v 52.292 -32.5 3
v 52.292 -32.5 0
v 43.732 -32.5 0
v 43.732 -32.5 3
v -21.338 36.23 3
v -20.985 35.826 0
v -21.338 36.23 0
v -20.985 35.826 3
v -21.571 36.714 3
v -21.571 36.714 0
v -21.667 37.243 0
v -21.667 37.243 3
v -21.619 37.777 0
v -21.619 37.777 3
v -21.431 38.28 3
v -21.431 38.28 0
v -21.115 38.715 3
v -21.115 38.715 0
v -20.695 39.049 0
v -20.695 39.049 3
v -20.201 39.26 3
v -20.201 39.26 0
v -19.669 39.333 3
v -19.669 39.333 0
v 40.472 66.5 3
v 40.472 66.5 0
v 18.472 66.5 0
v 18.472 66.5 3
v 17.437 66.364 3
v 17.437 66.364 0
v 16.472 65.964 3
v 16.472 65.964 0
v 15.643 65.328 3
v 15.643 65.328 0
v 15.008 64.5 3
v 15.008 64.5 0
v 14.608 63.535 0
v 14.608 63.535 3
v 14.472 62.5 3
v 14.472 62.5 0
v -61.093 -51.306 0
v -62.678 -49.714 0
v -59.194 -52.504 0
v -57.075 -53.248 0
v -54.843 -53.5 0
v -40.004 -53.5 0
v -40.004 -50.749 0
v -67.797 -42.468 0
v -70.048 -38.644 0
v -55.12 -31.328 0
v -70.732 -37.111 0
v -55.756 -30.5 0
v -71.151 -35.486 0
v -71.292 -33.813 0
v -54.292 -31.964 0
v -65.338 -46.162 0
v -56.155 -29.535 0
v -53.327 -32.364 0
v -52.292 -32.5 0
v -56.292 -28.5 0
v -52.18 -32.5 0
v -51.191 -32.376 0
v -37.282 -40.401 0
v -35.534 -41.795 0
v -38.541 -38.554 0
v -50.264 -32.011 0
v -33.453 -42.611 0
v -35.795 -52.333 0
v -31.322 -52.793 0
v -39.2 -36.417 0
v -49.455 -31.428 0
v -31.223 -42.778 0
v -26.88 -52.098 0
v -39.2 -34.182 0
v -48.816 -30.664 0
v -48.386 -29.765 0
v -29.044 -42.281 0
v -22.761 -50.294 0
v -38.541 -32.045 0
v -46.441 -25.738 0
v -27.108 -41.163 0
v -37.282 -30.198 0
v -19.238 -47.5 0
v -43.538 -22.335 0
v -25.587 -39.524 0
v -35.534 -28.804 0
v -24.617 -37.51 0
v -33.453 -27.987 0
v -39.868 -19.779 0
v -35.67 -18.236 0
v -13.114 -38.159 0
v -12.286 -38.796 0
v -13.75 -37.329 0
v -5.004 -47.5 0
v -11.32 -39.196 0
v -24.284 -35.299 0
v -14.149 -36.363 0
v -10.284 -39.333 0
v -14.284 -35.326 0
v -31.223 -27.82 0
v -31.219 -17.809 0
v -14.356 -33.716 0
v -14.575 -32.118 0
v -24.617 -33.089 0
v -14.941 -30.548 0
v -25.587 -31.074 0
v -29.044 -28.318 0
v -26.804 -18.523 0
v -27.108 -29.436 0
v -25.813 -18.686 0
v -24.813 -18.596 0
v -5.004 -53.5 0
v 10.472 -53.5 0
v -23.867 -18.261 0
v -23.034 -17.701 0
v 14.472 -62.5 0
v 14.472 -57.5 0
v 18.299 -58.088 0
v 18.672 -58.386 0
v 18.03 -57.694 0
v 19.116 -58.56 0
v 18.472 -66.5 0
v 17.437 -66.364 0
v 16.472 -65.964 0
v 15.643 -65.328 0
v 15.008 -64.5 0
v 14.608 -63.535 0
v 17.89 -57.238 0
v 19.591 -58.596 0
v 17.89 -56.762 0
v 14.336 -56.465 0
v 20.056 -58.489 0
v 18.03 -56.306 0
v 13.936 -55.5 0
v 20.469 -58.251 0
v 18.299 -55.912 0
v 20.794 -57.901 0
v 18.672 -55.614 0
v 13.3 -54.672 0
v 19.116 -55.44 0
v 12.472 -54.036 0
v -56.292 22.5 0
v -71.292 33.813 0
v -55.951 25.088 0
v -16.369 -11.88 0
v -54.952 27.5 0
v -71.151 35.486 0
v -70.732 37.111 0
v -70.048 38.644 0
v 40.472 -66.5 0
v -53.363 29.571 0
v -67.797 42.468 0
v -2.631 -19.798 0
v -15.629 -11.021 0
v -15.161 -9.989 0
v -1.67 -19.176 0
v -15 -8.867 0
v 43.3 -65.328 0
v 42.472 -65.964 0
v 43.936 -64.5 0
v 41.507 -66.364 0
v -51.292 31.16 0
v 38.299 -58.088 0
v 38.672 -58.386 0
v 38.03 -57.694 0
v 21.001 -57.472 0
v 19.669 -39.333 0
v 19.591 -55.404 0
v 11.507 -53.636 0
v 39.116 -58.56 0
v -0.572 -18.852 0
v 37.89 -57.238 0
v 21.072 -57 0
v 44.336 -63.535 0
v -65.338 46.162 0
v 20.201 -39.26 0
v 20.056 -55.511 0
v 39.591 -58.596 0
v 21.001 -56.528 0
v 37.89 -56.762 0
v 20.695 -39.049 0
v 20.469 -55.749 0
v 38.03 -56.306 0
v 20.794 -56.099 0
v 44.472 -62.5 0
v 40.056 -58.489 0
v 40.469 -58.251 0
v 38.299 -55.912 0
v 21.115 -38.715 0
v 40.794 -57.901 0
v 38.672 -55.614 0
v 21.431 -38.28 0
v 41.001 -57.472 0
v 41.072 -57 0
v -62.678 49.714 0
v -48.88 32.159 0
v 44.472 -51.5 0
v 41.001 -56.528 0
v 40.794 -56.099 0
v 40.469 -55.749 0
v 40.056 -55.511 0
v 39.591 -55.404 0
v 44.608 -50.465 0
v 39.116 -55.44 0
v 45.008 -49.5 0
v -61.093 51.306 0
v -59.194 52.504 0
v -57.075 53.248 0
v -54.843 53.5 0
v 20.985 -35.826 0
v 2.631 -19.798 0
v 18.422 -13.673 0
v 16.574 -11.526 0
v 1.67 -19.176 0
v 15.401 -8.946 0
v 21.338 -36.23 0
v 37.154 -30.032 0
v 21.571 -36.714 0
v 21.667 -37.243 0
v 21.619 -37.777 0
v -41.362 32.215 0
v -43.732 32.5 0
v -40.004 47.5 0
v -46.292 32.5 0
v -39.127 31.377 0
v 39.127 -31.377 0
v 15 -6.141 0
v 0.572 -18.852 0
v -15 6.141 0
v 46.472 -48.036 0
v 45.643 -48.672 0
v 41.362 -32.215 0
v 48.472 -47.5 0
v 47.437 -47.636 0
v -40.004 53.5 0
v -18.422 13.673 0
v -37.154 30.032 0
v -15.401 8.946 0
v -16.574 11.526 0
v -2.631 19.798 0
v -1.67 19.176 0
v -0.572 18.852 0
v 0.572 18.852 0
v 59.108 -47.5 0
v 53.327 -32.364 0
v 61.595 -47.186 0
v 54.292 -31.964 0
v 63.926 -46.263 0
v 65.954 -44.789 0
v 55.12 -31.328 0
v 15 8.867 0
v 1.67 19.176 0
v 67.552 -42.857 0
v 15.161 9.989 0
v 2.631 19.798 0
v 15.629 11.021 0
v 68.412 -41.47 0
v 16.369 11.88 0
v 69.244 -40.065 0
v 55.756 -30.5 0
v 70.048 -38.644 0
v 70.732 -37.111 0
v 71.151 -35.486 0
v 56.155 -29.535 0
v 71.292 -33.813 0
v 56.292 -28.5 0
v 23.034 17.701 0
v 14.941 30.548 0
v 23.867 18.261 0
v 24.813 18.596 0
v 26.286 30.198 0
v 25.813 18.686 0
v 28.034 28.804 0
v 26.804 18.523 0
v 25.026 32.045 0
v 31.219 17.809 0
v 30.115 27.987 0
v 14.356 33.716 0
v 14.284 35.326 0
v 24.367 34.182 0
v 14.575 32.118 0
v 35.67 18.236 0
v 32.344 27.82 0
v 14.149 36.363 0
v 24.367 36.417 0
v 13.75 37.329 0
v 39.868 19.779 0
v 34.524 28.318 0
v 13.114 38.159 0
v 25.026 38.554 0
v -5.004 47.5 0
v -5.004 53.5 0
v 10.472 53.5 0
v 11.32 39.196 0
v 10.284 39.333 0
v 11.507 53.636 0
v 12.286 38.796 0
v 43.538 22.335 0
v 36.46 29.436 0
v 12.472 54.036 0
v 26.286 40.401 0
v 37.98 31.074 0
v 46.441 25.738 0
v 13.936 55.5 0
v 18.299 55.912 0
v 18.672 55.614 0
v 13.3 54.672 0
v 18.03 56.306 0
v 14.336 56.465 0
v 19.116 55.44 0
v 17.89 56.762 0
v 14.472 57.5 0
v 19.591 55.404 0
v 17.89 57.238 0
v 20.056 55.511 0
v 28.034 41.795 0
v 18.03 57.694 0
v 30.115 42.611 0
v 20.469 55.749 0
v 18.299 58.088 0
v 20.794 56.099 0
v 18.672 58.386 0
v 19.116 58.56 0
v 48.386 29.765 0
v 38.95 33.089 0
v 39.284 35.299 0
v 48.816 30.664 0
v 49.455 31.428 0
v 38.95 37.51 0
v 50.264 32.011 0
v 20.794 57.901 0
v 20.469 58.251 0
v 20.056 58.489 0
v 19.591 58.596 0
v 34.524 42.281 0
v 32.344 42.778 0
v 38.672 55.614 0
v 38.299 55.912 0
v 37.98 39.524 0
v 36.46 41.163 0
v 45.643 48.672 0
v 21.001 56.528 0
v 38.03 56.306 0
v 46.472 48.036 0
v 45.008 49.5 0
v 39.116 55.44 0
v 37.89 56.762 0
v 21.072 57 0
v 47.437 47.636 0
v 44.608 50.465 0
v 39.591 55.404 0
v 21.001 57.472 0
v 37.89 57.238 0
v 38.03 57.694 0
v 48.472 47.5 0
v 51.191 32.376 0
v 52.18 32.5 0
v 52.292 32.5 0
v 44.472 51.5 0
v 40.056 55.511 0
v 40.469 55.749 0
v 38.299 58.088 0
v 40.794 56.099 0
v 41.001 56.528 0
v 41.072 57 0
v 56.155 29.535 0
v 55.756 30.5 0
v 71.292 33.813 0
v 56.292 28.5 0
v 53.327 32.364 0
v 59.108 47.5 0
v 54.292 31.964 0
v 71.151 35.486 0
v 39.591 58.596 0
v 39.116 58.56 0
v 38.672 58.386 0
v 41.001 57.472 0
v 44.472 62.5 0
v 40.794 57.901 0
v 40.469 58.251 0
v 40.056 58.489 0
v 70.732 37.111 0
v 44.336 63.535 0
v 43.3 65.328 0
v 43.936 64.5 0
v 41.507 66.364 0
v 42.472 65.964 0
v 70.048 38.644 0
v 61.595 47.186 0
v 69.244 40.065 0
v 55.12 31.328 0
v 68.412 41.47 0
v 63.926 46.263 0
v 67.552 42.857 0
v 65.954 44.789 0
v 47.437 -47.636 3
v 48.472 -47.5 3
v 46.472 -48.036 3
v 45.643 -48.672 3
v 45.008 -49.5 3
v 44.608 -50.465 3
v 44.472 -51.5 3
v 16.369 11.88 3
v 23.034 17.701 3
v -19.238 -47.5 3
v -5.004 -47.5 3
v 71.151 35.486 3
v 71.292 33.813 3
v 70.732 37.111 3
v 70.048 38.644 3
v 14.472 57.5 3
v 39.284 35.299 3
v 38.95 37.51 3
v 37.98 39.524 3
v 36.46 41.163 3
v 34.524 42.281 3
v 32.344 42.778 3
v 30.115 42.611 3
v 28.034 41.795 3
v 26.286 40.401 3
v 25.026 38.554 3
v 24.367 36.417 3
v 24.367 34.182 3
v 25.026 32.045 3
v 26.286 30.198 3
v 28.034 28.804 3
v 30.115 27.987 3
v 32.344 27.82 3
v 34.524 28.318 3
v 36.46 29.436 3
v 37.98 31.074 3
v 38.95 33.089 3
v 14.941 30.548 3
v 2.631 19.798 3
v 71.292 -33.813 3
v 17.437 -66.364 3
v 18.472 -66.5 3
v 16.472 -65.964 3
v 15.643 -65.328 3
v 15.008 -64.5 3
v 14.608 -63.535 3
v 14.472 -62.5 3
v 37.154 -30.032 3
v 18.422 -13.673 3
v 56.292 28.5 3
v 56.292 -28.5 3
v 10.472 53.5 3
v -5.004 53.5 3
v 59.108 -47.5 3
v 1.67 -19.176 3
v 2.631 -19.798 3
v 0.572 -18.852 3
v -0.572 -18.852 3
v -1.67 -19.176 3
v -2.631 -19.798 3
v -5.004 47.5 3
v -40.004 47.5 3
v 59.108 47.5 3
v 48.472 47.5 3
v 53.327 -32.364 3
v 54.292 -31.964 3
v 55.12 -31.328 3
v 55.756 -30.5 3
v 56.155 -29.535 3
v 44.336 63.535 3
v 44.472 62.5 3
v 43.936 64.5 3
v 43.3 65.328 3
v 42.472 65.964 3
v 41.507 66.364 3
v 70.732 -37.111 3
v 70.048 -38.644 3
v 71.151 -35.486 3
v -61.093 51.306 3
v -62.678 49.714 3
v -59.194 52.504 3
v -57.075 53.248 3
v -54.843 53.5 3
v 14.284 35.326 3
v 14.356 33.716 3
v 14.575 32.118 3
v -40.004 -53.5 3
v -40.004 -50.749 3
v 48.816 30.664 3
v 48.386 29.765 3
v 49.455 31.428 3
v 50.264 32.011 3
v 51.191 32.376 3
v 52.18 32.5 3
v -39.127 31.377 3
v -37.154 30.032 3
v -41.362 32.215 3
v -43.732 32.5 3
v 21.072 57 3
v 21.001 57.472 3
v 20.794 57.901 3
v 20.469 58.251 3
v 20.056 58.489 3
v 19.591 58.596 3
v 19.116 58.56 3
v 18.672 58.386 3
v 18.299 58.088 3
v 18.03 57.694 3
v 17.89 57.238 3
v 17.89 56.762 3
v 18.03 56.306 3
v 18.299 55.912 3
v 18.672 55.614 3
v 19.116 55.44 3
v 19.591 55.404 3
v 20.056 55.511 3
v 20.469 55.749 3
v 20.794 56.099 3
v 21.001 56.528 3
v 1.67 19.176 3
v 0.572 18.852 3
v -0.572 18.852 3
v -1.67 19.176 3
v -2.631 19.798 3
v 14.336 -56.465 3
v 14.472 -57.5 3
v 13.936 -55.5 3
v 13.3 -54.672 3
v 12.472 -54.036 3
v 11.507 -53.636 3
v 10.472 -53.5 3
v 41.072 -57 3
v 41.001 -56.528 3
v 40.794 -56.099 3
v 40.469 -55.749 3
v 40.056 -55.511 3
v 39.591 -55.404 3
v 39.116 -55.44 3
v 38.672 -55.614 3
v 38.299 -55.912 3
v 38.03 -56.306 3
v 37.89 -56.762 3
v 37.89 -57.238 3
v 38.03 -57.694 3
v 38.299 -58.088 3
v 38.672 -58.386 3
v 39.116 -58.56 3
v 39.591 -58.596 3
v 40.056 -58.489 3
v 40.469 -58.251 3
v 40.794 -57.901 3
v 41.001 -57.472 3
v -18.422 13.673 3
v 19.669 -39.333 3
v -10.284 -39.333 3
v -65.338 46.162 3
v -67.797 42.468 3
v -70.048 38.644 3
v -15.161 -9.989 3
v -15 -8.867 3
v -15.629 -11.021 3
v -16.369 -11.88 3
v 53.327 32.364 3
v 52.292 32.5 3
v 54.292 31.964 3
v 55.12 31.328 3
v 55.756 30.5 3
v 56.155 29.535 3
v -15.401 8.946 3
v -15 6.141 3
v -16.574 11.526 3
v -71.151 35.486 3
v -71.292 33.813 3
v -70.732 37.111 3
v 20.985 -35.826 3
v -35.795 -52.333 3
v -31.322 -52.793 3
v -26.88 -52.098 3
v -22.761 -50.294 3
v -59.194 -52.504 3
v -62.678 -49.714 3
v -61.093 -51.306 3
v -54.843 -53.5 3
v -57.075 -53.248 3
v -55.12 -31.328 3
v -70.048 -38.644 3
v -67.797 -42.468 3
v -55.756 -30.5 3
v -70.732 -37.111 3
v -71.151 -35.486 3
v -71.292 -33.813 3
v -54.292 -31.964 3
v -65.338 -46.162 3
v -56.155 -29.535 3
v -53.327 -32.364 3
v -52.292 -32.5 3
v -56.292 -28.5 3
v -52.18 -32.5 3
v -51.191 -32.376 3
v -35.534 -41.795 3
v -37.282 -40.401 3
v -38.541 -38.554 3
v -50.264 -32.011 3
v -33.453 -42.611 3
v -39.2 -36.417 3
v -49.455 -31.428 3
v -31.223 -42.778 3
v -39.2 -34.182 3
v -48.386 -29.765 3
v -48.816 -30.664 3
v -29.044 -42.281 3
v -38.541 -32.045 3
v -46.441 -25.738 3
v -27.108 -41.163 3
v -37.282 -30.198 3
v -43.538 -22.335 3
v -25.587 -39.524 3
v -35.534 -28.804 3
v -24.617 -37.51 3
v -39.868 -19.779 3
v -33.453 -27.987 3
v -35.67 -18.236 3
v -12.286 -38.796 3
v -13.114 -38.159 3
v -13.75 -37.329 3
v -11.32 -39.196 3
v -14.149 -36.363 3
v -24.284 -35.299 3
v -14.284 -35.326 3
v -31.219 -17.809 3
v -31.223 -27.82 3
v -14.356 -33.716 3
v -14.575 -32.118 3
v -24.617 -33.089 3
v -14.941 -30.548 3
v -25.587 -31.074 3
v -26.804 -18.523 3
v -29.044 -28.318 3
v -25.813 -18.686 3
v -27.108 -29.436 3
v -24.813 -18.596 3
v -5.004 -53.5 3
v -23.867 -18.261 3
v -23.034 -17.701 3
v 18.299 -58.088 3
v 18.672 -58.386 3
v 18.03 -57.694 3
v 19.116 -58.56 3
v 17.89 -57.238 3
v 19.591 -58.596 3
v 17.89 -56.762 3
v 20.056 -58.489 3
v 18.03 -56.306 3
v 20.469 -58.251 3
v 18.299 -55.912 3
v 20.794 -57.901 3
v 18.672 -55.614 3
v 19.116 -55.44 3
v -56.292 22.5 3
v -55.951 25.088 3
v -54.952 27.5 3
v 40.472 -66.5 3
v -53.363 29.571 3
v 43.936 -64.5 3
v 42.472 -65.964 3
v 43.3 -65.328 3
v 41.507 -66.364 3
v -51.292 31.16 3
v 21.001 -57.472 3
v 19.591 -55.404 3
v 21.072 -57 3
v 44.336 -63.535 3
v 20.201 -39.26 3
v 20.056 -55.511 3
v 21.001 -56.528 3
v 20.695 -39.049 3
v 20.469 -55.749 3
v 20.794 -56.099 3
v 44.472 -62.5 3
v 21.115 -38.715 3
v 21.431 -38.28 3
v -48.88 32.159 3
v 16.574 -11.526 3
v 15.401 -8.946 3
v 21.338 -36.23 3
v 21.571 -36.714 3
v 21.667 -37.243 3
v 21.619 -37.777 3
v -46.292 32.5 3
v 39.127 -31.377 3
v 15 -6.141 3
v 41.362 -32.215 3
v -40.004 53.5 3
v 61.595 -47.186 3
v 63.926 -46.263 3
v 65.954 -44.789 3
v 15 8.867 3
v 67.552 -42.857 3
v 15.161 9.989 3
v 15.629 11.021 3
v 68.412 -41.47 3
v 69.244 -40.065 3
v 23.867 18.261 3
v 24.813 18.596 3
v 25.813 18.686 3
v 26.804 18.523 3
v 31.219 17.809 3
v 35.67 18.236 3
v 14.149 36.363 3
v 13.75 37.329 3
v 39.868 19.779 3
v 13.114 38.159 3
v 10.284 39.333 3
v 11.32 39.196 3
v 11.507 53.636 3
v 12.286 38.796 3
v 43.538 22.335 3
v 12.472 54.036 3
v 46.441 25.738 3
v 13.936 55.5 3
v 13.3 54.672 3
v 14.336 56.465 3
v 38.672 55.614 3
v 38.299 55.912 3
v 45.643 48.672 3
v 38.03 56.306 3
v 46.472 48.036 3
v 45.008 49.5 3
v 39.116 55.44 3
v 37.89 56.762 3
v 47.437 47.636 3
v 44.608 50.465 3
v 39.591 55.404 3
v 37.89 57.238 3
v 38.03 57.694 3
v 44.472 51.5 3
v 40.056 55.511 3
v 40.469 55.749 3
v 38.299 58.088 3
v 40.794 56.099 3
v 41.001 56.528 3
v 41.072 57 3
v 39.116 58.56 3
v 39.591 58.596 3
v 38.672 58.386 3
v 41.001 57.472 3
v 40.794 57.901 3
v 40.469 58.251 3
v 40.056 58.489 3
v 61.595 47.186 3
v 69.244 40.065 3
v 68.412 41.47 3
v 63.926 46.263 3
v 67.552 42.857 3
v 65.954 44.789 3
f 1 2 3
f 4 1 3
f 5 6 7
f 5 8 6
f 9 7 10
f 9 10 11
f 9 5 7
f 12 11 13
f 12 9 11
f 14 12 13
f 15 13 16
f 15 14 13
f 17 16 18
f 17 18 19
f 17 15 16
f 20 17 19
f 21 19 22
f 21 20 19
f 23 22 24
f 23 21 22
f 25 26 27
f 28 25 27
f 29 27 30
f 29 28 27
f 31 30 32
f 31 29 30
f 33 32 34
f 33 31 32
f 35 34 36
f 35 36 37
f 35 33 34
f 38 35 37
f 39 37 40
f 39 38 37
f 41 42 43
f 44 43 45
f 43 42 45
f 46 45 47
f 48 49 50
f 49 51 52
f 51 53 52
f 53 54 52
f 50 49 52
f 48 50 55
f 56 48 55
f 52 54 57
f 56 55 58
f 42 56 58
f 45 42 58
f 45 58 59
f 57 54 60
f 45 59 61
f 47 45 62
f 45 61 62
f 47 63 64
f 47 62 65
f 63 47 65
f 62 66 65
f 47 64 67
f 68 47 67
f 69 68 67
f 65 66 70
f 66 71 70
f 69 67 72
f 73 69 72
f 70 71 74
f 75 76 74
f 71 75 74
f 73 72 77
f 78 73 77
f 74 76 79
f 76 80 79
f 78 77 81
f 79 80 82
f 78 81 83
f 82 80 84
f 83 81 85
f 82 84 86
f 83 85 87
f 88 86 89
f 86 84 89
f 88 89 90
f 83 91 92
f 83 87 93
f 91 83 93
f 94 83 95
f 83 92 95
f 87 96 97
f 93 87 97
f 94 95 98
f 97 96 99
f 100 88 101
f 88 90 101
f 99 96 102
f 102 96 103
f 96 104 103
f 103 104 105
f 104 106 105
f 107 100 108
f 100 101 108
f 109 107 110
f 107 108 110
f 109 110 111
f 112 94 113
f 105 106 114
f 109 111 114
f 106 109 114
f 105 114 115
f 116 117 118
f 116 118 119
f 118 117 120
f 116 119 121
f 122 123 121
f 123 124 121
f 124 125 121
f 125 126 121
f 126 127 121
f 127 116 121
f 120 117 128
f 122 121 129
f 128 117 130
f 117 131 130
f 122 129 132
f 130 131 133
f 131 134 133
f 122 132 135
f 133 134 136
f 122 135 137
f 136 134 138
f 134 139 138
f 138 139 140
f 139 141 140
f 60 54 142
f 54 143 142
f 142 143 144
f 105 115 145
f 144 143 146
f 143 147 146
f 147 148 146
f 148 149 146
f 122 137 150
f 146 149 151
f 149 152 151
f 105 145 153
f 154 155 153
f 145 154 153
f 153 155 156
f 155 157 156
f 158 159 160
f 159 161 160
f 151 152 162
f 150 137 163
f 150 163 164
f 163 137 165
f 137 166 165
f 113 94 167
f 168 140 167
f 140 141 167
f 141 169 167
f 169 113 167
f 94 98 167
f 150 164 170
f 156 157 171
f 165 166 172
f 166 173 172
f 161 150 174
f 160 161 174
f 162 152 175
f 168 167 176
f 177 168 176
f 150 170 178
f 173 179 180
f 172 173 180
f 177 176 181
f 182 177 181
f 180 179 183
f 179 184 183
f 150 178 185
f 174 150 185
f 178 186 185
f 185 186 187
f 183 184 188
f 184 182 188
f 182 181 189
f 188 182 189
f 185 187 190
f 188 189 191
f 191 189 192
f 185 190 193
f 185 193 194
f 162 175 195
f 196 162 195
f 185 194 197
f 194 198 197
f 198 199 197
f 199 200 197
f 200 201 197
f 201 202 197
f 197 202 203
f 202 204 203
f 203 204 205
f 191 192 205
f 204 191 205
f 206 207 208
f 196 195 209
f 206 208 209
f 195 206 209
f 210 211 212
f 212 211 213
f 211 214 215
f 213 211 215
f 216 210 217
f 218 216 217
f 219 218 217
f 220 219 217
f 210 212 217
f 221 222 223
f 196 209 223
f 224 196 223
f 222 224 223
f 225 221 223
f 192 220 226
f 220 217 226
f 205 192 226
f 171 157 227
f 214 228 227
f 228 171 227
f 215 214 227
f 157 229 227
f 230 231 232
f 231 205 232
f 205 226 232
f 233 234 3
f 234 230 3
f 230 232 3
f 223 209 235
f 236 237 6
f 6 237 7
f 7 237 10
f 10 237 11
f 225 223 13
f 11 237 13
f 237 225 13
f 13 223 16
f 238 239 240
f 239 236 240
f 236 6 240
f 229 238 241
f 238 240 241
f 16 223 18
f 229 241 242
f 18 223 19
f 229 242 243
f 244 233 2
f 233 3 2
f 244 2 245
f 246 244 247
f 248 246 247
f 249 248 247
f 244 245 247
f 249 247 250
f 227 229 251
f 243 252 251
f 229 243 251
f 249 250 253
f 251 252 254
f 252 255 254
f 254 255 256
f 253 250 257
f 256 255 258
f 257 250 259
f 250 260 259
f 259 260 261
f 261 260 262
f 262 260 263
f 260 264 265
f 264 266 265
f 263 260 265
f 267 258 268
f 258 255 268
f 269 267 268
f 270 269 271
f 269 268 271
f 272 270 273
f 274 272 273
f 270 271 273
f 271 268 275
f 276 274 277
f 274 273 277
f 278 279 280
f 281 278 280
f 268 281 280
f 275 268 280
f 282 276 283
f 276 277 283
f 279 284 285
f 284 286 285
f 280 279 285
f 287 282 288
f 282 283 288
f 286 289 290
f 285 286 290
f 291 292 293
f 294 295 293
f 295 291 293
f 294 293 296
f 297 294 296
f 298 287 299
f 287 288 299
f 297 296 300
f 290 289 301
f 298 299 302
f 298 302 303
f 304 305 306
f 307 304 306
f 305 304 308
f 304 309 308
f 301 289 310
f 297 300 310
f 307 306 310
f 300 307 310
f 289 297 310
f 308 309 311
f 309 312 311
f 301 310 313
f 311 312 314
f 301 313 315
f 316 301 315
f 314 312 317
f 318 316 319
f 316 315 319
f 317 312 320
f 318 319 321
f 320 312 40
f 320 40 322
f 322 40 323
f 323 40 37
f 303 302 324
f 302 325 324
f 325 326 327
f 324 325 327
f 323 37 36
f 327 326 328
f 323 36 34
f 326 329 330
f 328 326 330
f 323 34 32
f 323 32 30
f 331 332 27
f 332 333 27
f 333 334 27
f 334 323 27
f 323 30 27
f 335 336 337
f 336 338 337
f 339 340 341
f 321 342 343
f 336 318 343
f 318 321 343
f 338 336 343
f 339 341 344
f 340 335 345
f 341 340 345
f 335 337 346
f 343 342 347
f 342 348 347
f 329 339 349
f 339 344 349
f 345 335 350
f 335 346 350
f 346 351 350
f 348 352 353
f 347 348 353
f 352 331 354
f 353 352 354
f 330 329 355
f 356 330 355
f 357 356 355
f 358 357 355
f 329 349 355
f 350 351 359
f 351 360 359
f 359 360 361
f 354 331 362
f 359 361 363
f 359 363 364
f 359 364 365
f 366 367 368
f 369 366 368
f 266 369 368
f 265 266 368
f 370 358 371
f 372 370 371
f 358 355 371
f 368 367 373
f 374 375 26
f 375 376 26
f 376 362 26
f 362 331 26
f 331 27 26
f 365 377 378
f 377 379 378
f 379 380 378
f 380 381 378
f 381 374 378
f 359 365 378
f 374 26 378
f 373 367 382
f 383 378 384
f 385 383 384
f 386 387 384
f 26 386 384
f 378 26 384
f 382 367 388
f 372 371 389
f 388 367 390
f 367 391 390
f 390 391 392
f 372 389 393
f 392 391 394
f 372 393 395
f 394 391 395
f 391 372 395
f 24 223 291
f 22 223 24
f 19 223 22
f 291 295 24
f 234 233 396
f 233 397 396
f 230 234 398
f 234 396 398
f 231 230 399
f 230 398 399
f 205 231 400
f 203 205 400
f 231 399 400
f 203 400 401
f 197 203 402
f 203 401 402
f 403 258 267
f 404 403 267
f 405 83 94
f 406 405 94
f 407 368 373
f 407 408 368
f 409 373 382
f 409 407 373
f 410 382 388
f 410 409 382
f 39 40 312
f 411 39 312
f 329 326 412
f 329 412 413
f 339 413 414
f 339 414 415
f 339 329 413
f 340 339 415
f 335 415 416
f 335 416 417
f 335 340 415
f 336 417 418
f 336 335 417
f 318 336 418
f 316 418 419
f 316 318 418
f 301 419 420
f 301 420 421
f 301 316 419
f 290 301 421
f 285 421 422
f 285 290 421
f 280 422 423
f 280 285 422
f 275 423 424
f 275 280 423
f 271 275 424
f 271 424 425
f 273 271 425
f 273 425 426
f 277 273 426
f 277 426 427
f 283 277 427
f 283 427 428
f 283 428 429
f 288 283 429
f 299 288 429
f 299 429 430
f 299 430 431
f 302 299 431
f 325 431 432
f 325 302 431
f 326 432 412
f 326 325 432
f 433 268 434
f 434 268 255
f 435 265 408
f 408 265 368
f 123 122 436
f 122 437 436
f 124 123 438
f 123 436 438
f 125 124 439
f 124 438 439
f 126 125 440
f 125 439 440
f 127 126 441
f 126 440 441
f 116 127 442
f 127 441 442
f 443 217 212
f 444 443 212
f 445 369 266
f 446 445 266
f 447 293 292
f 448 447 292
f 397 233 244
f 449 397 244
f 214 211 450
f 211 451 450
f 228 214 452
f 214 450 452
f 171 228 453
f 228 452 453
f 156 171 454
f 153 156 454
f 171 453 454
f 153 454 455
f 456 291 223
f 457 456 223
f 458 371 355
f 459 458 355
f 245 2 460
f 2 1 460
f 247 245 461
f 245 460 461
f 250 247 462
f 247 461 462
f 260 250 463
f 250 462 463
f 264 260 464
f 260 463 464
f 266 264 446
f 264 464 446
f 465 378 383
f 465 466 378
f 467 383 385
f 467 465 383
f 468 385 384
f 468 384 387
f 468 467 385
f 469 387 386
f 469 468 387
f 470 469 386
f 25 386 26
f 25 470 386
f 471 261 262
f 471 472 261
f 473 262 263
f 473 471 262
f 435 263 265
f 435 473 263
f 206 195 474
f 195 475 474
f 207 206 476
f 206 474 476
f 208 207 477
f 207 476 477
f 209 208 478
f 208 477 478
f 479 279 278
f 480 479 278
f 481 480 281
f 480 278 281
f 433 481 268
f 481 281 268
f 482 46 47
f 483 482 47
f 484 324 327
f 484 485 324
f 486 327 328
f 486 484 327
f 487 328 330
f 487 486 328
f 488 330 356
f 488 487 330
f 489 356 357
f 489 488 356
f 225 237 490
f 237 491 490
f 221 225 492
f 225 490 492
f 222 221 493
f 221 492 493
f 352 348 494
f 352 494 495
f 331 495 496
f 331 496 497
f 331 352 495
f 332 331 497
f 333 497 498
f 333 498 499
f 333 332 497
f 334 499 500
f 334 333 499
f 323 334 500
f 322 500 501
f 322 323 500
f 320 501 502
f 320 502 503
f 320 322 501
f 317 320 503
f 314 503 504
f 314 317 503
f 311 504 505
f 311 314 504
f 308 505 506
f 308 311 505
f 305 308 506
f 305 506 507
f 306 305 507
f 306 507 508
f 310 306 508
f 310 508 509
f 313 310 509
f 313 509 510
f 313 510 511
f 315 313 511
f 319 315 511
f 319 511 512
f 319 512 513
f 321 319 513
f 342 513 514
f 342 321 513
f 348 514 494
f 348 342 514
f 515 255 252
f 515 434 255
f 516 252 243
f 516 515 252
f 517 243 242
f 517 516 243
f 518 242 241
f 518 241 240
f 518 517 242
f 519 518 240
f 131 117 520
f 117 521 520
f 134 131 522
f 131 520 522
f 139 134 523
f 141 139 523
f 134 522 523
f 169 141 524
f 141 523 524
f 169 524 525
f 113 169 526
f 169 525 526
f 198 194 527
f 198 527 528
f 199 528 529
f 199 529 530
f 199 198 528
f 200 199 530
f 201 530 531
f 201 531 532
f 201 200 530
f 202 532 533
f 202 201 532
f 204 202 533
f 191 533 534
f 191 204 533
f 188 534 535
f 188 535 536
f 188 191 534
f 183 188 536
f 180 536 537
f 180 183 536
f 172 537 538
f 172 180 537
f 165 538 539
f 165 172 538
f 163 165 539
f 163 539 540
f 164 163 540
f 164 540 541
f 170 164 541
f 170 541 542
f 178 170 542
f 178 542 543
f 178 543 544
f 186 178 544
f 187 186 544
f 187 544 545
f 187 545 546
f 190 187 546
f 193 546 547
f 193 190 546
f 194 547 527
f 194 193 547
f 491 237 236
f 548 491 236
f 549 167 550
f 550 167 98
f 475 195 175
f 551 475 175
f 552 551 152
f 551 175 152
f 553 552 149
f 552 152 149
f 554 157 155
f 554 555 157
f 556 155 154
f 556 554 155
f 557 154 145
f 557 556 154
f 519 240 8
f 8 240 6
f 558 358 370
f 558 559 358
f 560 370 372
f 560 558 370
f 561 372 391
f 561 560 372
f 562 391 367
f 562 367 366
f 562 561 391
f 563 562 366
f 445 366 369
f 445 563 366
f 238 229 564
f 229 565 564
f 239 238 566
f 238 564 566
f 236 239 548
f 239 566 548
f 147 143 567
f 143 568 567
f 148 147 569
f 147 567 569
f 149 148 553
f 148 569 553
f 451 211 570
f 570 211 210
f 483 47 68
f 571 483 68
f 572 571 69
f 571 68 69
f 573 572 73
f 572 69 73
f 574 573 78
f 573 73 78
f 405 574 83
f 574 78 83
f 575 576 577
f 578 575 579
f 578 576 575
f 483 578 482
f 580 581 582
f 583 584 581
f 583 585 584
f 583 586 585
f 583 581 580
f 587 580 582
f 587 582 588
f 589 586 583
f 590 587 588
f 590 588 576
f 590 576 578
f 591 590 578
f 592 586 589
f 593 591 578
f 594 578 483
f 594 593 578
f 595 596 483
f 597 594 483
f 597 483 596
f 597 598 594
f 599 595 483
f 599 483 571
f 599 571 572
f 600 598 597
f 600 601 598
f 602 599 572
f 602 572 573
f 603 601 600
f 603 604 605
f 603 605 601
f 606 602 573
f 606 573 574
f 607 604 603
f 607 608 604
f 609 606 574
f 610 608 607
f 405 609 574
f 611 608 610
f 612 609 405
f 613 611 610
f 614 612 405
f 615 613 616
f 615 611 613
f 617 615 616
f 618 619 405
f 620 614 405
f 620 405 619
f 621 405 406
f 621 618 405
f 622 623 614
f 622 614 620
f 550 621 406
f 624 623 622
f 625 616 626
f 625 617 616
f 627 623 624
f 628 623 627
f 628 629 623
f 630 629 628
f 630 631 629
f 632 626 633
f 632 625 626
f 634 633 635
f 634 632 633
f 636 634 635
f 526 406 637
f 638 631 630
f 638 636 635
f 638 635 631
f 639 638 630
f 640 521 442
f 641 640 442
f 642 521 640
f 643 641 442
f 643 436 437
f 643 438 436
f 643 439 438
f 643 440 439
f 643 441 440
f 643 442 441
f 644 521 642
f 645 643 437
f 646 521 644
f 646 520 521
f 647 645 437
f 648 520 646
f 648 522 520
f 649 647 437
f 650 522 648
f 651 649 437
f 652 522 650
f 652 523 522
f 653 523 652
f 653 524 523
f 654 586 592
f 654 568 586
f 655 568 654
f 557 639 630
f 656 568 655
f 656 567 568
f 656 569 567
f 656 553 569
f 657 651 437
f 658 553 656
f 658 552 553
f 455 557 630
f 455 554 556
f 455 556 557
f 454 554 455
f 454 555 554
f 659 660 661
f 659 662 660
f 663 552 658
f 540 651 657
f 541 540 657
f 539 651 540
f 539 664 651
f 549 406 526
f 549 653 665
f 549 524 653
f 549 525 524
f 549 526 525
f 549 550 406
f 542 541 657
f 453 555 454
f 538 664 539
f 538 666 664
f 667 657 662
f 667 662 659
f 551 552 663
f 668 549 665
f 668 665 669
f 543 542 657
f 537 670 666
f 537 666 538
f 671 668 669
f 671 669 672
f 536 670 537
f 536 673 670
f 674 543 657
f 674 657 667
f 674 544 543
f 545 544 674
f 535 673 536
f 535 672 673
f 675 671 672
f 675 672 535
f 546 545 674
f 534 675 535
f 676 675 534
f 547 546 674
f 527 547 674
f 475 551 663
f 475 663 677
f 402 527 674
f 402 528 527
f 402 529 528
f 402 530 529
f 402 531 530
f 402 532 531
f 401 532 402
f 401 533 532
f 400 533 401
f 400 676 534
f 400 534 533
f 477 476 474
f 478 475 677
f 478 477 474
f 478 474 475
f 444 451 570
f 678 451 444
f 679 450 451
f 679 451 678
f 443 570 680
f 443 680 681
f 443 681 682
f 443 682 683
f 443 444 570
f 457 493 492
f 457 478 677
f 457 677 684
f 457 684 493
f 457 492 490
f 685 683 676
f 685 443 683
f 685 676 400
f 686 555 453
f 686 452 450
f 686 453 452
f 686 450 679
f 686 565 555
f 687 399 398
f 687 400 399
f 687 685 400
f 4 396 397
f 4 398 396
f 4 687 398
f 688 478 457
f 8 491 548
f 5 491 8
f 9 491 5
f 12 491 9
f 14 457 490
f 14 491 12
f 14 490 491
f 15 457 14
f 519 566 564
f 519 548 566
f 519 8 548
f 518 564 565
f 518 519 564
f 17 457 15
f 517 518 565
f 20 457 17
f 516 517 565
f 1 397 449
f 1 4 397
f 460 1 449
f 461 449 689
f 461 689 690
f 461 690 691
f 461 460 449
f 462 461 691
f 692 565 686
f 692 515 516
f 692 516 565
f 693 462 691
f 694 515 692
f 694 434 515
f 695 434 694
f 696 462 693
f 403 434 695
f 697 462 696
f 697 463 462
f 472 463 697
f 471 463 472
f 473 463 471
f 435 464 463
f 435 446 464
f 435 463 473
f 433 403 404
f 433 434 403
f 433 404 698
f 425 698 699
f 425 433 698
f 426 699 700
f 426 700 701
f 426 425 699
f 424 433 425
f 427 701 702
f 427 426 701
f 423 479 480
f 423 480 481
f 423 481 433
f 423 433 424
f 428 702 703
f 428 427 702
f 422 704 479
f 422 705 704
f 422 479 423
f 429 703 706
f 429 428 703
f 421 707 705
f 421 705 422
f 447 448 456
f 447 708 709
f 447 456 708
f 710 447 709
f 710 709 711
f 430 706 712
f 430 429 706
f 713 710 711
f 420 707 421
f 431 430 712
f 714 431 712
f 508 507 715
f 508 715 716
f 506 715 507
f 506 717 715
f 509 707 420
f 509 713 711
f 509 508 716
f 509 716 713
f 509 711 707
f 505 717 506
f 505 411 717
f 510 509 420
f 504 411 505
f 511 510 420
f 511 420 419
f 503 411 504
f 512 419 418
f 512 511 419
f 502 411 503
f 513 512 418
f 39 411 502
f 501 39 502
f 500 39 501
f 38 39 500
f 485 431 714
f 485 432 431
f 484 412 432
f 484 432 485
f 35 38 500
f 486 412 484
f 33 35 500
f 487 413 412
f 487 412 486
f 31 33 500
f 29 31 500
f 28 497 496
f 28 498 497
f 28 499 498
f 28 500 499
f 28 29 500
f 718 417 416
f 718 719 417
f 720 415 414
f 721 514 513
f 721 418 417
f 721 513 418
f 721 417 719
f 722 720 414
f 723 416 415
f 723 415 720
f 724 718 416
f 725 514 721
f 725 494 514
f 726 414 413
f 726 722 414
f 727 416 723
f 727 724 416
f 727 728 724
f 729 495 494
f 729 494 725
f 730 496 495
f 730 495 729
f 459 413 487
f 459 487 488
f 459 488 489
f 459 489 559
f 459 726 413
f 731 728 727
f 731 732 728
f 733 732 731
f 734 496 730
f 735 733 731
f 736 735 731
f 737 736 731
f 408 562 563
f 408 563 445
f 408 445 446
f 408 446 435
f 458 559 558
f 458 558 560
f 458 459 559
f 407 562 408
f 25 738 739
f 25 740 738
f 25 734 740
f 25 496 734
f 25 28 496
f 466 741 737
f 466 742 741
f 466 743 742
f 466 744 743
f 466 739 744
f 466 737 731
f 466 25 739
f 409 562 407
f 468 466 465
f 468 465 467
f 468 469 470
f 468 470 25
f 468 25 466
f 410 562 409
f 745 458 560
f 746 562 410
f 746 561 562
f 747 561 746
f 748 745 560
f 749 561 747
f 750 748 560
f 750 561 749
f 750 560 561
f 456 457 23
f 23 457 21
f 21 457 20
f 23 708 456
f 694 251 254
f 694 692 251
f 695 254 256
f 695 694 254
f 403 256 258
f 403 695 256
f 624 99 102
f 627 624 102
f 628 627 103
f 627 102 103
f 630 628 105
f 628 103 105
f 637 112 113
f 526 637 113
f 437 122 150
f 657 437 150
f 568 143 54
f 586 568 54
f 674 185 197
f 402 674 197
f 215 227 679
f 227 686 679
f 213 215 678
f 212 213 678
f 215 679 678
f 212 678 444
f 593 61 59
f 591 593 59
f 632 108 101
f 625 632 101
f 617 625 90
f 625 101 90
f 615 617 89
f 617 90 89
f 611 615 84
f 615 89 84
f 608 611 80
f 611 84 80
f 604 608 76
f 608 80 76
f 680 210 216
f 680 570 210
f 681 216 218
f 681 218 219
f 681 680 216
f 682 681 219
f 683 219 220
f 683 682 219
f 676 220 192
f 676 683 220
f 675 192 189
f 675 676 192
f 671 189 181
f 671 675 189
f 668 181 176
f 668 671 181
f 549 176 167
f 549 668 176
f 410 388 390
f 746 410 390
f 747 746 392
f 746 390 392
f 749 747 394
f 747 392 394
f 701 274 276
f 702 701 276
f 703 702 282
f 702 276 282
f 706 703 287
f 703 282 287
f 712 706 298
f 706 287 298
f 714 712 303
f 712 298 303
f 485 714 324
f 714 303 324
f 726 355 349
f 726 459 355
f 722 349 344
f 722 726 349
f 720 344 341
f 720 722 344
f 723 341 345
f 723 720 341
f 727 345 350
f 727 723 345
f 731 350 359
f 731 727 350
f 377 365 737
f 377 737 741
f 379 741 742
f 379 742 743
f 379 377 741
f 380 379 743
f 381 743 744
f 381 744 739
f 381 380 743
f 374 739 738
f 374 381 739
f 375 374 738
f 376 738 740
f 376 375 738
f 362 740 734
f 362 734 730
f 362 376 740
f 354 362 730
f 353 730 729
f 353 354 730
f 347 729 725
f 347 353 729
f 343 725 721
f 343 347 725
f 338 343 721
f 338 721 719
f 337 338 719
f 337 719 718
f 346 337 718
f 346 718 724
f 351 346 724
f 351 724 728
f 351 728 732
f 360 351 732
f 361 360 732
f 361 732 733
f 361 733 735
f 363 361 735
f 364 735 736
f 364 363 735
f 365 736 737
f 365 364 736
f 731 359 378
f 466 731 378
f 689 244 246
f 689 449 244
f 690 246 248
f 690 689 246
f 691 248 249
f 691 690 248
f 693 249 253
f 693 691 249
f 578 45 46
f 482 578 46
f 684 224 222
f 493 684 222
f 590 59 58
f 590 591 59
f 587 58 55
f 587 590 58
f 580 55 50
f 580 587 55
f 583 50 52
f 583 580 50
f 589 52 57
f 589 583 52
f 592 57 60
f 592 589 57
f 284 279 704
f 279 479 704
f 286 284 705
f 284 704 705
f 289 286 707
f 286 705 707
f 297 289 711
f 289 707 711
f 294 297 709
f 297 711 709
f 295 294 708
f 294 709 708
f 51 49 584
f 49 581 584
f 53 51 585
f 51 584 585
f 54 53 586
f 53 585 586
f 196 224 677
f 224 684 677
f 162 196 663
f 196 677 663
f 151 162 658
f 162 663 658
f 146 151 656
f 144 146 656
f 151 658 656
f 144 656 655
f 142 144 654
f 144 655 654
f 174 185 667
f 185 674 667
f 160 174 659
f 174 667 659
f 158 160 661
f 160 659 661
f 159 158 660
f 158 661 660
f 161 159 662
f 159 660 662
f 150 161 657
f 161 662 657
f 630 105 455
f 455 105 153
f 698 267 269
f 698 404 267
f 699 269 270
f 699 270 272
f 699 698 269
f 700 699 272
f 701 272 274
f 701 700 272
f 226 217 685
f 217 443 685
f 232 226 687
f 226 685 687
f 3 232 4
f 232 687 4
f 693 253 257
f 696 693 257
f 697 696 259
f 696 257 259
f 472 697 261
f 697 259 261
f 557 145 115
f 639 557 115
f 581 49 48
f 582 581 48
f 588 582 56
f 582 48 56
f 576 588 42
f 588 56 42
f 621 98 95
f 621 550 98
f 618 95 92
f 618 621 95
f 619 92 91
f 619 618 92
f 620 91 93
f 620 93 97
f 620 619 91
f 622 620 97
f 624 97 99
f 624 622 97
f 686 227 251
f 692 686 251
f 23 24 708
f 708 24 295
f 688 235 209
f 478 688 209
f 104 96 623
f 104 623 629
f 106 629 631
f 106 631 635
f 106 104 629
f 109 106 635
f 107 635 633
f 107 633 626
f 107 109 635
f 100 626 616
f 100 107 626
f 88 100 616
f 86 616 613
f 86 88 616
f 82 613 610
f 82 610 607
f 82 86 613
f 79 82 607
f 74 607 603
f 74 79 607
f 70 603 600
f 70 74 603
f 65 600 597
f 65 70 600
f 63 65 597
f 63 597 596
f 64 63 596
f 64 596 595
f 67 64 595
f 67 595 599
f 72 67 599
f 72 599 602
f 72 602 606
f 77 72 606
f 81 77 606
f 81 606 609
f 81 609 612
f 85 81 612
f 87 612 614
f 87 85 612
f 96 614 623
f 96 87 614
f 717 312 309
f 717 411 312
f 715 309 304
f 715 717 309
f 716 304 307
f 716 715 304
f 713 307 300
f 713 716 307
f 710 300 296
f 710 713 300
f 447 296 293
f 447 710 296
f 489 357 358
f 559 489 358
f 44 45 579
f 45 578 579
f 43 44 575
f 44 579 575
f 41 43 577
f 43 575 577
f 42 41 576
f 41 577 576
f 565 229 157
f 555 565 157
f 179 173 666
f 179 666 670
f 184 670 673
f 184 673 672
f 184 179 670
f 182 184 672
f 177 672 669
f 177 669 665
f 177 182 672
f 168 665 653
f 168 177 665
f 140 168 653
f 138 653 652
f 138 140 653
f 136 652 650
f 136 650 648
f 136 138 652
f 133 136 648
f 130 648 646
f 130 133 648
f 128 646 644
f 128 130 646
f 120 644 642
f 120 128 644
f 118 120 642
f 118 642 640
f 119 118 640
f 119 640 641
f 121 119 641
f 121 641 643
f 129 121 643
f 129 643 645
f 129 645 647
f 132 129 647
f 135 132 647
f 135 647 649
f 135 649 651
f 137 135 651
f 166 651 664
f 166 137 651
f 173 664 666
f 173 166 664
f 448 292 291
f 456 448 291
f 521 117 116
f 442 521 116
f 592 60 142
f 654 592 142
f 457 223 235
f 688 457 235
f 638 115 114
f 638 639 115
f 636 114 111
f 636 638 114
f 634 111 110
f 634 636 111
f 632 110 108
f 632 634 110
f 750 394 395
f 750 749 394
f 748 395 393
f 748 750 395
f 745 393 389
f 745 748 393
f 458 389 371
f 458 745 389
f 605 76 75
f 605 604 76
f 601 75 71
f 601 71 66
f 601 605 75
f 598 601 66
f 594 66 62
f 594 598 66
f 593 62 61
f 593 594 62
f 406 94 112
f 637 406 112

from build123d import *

# Parameters (mm, degrees)
ESBO_O1_R                = 7.5
ESBO_O1_R_2              = 1.6
RESSALTO_EXTRUS_O1_DEPTH = 3
FILETE2_R                = 10
FILETE3_R                = 4
FILETE4_R                = 2


with BuildPart() as part:
    # Esboço1 → Ressalto-extrusão1 (new body)
    with BuildSketch(Plane.XY):
        with BuildLine():
            Line((14.471901241, -53.5), (14.471901241, -66.5))
            Line((14.471901241, -66.5), (44.471901241, -66.5))
            Line((44.471901241, -66.5), (44.471901241, -47.5))
            Line((44.471901241, -47.5), (64.371965948, -47.5))
            ThreePointArc((64.371965948, -47.5), (68.06268346, -42.041302552), (71.291651246, -36.297389198))
            Line((71.291651246, -36.297389198), (71.291651246, 36.297389198))
            ThreePointArc((71.291651246, 36.297389198), (68.06268346, 42.041302552), (64.371965948, 47.5))
            Line((64.371965948, 47.5), (44.471901241, 47.5))
            Line((44.471901241, 47.5), (44.471901241, 66.5))
            Line((44.471901241, 66.5), (14.471901241, 66.5))
            Line((14.471901241, 66.5), (14.471901241, 53.5))
            Line((14.471901241, 53.5), (-5.003543323, 53.5))
            Line((-5.003543323, 53.5), (-5.003543323, 47.5))
            Line((-5.003543323, 47.5), (-40.003543323, 47.5))
            Line((-40.003543323, 47.5), (-40.003543323, 53.5))
            Line((-40.003543323, 53.5), (-59.478987886, 53.5))
            ThreePointArc((-59.478987886, 53.5), (-65.948635083, 45.285511266), (-71.291651246, 36.297389198))
            Line((-71.291651246, 36.297389198), (-71.291651246, -36.297389198))
            ThreePointArc((-71.291651246, -36.297389198), (-65.948635083, -45.285511266), (-59.478987886, -53.5))
            Line((-59.478987886, -53.5), (-40.003543323, -53.5))
            Line((-40.003543323, -53.5), (-40.003543323, -50.748788204))
            ThreePointArc((-40.003543323, -50.748788204), (-29.078718374, -52.589059769), (-19.237993286, -47.5))
            Line((-19.237993286, -47.5), (-5.003543323, -47.5))
            Line((-5.003543323, -47.5), (-5.003543323, -53.5))
            Line((-5.003543323, -53.5), (14.471901241, -53.5))
        make_face()
        with Locations((-31.783703802, -35.29937921)):
            Circle(ESBO_O1_R, mode=Mode.SUBTRACT)
        with Locations((19.471901241, -57)):
            Circle(ESBO_O1_R_2, mode=Mode.SUBTRACT)
        with Locations((39.471901241, -57)):
            Circle(ESBO_O1_R_2, mode=Mode.SUBTRACT)
        with BuildLine():
            Line((25, -39.332538239), (-14.754798134, -39.332538239))
            ThreePointArc((-14.754798134, -39.332538239), (-14.287636143, -34.928412284), (-14.941054623, -30.548045856))
            Line((-14.941054623, -30.548045856), (0, -17.5))
            Line((0, -17.5), (25, -39.332538239))
        make_face(mode=Mode.SUBTRACT)
        with BuildLine():
            Line((-15, -10.684767074), (-24.807750727, -19.249890785))
            ThreePointArc((-24.807750727, -19.249890785), (-40.174599446, -19.942202702), (-49.058352164, -32.5))
            Line((-49.058352164, -32.5), (-56.291651246, -32.5))
            Line((-56.291651246, -32.5), (-56.291651246, 32.5))
            Line((-56.291651246, 32.5), (-39.980184035, 32.5))
            Line((-39.980184035, 32.5), (-15, 10.684767074))
            Line((-15, 10.684767074), (-15, -10.684767074))
        make_face(mode=Mode.SUBTRACT)
        with BuildLine():
            Line((49.058352164, 32.5), (56.291651246, 32.5))
            Line((56.291651246, 32.5), (56.291651246, -32.5))
            Line((56.291651246, -32.5), (39.980184035, -32.5))
            Line((39.980184035, -32.5), (15, -10.684767074))
            Line((15, -10.684767074), (15, 10.684767074))
            Line((15, 10.684767074), (24.807750727, 19.249890785))
            ThreePointArc((24.807750727, 19.249890785), (40.174599446, 19.942202702), (49.058352164, 32.5))
        make_face(mode=Mode.SUBTRACT)
        with BuildLine():
            Line((0, 17.5), (-25, 39.332538239))
            Line((-25, 39.332538239), (14.754798134, 39.332538239))
            ThreePointArc((14.754798134, 39.332538239), (14.287636143, 34.928412284), (14.941054623, 30.548045856))
            Line((14.941054623, 30.548045856), (0, 17.5))
        make_face(mode=Mode.SUBTRACT)
        with Locations((19.471901241, 57)):
            Circle(ESBO_O1_R_2, mode=Mode.SUBTRACT)
        with Locations((39.471901241, 57)):
            Circle(ESBO_O1_R_2, mode=Mode.SUBTRACT)
        with Locations((31.783703802, 35.29937921)):
            Circle(ESBO_O1_R, mode=Mode.SUBTRACT)
    extrude(amount=RESSALTO_EXTRUS_O1_DEPTH)

    # Filete2
    filete2_edges = [part.edges().sort_by_distance(p)[0] for p in [
        (-15, 10.684767074, 1.5),
        (-39.980184035, 32.5, 1.5),
        (-56.291651246, 32.5, 1.5),
        (-59.478987886, -53.5, 1.5),
        (-71.291651246, -36.297389198, 1.5),
        (-71.291651246, 36.297389198, 1.5),
        (-59.478987886, 53.5, 1.5),
        (64.371965948, 47.5, 1.5),
        (71.291651246, 36.297389198, 1.5),
        (71.291651246, -36.297389198, 1.5),
        (64.371965948, -47.5, 1.5),
        (15, -10.684767074, 1.5),
        (39.980184035, -32.5, 1.5),
    ]]
    fillet(filete2_edges, radius=FILETE2_R)

    # Filete3
    filete3_edges = [part.edges().sort_by_distance(p)[0] for p in [
        (56.291651246, -32.5, 1.5),
        (56.291651246, 32.5, 1.5),
        (49.058352164, 32.5, 1.5),
        (24.807750727, 19.249890785, 1.5),
        (14.754798134, 39.332538239, 1.5),
        (0, 17.5, 1.5),
        (-15, -10.684767074, 1.5),
        (-56.291651246, -32.5, 1.5),
        (-49.058352164, -32.5, 1.5),
        (-24.807750727, -19.249890785, 1.5),
        (-14.754798134, -39.332538239, 1.5),
        (0, -17.5, 1.5),
        (14.471901241, 53.5, 1.5),
        (14.471901241, 66.5, 1.5),
        (44.471901241, 66.5, 1.5),
        (44.471901241, 47.5, 1.5),
        (44.471901241, -47.5, 1.5),
        (44.471901241, -66.5, 1.5),
        (14.471901241, -66.5, 1.5),
        (14.471901241, -53.5, 1.5),
        (15, 10.684767074, 1.5),
    ]]
    fillet(filete3_edges, radius=FILETE3_R)

    # Filete4
    filete4_edges = [part.edges().sort_by_distance(p)[0] for p in [
        (-25, 39.332538239, 1.5),
        (25, -39.332538239, 1.5),
    ]]
    fillet(filete4_edges, radius=FILETE4_R)


solid = part.part
